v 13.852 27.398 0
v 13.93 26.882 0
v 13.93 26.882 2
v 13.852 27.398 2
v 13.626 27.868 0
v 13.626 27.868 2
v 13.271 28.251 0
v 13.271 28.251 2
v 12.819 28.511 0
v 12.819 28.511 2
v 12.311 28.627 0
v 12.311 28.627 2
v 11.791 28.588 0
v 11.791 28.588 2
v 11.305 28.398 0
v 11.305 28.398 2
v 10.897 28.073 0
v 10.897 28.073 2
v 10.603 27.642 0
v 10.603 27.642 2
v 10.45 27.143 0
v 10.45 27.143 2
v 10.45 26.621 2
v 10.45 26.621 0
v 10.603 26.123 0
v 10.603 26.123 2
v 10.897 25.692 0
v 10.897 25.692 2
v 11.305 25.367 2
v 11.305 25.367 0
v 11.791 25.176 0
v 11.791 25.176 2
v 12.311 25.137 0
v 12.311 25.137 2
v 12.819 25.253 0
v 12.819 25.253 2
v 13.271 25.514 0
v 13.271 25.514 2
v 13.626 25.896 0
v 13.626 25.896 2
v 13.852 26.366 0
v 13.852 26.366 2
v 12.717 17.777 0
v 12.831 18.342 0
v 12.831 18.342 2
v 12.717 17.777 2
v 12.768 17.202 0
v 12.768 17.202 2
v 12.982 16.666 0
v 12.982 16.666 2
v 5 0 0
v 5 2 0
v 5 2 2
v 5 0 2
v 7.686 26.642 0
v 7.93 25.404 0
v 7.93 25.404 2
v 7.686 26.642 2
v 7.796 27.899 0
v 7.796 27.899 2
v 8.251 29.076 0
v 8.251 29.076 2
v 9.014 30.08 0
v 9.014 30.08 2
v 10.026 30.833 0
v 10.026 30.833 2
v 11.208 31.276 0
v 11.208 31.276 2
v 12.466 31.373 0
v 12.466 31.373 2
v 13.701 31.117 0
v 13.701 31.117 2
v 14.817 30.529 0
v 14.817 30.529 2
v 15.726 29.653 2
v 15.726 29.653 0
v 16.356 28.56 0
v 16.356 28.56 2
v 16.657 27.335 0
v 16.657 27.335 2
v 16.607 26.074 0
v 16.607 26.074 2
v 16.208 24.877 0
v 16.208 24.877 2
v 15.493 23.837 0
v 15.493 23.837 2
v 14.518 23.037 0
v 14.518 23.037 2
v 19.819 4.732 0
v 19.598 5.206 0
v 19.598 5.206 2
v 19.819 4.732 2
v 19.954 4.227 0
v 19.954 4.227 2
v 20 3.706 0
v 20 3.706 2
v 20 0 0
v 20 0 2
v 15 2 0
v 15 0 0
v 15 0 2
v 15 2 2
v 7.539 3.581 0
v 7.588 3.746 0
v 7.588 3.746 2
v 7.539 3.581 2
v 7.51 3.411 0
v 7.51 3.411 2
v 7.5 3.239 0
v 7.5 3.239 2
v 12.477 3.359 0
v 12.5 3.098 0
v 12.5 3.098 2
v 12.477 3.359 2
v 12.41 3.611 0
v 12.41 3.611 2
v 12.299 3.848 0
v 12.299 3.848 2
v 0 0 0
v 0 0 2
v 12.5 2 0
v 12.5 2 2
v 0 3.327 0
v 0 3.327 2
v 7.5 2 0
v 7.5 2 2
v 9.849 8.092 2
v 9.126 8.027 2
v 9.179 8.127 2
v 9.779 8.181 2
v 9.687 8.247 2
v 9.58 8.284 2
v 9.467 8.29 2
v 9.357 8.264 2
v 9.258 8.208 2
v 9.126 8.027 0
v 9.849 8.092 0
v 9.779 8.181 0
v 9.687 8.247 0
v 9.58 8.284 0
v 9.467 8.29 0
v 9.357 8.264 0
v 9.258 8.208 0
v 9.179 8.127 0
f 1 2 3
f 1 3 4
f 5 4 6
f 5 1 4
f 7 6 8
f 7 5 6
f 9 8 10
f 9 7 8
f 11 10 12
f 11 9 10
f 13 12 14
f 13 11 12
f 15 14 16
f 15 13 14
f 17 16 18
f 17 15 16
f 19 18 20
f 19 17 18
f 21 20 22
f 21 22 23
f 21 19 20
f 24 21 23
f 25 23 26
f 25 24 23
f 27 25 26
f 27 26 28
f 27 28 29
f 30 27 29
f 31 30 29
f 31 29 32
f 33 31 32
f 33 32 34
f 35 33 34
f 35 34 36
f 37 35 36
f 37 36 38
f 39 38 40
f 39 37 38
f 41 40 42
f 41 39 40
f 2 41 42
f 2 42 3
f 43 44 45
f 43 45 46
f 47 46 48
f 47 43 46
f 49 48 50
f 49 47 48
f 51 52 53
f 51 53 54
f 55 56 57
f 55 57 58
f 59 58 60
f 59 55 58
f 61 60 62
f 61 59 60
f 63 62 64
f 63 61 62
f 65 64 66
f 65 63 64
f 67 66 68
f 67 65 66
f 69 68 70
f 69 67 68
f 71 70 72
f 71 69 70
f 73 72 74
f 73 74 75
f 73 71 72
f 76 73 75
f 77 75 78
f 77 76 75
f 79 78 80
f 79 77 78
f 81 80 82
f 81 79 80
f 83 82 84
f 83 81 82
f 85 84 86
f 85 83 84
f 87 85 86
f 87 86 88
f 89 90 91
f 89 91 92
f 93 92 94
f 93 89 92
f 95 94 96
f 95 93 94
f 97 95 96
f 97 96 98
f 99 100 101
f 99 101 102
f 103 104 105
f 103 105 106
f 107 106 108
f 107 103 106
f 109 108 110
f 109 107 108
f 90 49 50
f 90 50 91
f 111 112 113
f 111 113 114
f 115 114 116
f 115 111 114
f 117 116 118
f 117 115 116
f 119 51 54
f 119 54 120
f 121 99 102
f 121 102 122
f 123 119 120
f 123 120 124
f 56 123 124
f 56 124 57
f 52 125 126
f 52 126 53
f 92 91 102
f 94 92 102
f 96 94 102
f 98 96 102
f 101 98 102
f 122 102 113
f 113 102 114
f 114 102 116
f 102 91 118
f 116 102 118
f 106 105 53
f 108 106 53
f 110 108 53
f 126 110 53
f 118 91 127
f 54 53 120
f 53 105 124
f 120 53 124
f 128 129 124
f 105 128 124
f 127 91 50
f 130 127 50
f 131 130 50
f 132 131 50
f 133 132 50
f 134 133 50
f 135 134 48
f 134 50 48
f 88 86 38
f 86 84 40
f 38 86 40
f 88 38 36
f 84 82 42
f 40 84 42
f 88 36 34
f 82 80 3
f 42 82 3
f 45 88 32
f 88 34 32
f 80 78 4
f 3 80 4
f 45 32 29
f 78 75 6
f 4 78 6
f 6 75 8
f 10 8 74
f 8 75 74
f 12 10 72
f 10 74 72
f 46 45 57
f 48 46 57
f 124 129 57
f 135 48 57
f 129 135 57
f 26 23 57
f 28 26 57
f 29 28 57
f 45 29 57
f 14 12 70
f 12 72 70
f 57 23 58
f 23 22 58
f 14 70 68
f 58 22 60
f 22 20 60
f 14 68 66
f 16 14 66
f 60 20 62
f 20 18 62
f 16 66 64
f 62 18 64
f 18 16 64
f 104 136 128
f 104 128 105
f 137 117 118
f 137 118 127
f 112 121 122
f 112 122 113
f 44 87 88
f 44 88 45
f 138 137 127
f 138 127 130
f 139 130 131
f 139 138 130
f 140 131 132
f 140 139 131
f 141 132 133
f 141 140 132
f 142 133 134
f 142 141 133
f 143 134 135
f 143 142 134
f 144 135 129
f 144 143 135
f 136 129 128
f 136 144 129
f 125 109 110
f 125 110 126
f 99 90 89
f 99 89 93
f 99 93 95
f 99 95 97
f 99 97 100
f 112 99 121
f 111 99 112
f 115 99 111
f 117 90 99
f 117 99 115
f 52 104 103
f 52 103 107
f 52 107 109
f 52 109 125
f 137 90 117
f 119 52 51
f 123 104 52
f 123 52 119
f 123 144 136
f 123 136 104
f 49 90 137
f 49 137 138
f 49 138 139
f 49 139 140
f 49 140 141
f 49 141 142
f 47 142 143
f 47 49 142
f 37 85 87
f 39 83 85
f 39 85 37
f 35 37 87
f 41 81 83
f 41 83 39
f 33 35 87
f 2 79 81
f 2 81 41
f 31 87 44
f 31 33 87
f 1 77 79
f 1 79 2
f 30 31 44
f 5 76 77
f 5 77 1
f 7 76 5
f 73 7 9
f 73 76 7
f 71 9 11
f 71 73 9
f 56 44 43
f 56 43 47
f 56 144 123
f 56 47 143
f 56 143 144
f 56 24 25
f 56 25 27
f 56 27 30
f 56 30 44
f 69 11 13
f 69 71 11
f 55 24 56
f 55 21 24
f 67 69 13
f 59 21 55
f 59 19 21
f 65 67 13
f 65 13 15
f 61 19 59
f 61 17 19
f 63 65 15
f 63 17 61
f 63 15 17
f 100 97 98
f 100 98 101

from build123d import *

# Parameters (mm, degrees)
SKETCH1_R           = 1.75
BOSS_EXTRUDE1_DEPTH = 2


with BuildPart() as part:
    # Sketch1 → Boss-Extrude1 (new body)
    with BuildSketch(Plane.XY):
        with BuildLine():
            Line((0, 0), (0, 3.327095189))
            Line((0, 3.327095189), (7.929895835, 25.403579408))
            ThreePointArc((7.929895835, 25.403579408), (13.70124174, 31.117370669), (14.517783542, 23.037203368))
            Line((14.517783542, 23.037203368), (12.831302958, 18.342114962))
            ThreePointArc((12.831302958, 18.342114962), (12.721539225, 17.487494723), (12.981505781, 16.666007522))
            Line((12.981505781, 16.666007522), (19.598076211, 5.205771366))
            ThreePointArc((19.598076211, 5.205771366), (19.897777479, 4.482228501), (20, 3.705771366))
            Line((20, 3.705771366), (20, 0))
            Line((20, 0), (15, 0))
            Line((15, 0), (15, 2))
            Line((15, 2), (12.5, 2))
            Line((12.5, 2), (12.5, 3.098076211))
            ThreePointArc((12.5, 3.098076211), (12.448888739, 3.486304779), (12.299038106, 3.848076211))
            Line((12.299038106, 3.848076211), (9.848953011, 8.091748078))
            ThreePointArc((9.848953011, 8.091748078), (9.46684029, 8.290151551), (9.126092124, 8.026969566))
            Line((9.126092124, 8.026969566), (7.588309777, 3.745850569))
            ThreePointArc((7.588309777, 3.745850569), (7.522242352, 3.49612642), (7.5, 3.238769989))
            Line((7.5, 3.238769989), (7.5, 2))
            Line((7.5, 2), (5, 2))
            Line((5, 2), (5, 0))
            Line((5, 0), (0, 0))
        make_face()
        with Locations((12.18, 26.8823)):
            Circle(SKETCH1_R, mode=Mode.SUBTRACT)
    extrude(amount=BOSS_EXTRUDE1_DEPTH)


solid = part.part
